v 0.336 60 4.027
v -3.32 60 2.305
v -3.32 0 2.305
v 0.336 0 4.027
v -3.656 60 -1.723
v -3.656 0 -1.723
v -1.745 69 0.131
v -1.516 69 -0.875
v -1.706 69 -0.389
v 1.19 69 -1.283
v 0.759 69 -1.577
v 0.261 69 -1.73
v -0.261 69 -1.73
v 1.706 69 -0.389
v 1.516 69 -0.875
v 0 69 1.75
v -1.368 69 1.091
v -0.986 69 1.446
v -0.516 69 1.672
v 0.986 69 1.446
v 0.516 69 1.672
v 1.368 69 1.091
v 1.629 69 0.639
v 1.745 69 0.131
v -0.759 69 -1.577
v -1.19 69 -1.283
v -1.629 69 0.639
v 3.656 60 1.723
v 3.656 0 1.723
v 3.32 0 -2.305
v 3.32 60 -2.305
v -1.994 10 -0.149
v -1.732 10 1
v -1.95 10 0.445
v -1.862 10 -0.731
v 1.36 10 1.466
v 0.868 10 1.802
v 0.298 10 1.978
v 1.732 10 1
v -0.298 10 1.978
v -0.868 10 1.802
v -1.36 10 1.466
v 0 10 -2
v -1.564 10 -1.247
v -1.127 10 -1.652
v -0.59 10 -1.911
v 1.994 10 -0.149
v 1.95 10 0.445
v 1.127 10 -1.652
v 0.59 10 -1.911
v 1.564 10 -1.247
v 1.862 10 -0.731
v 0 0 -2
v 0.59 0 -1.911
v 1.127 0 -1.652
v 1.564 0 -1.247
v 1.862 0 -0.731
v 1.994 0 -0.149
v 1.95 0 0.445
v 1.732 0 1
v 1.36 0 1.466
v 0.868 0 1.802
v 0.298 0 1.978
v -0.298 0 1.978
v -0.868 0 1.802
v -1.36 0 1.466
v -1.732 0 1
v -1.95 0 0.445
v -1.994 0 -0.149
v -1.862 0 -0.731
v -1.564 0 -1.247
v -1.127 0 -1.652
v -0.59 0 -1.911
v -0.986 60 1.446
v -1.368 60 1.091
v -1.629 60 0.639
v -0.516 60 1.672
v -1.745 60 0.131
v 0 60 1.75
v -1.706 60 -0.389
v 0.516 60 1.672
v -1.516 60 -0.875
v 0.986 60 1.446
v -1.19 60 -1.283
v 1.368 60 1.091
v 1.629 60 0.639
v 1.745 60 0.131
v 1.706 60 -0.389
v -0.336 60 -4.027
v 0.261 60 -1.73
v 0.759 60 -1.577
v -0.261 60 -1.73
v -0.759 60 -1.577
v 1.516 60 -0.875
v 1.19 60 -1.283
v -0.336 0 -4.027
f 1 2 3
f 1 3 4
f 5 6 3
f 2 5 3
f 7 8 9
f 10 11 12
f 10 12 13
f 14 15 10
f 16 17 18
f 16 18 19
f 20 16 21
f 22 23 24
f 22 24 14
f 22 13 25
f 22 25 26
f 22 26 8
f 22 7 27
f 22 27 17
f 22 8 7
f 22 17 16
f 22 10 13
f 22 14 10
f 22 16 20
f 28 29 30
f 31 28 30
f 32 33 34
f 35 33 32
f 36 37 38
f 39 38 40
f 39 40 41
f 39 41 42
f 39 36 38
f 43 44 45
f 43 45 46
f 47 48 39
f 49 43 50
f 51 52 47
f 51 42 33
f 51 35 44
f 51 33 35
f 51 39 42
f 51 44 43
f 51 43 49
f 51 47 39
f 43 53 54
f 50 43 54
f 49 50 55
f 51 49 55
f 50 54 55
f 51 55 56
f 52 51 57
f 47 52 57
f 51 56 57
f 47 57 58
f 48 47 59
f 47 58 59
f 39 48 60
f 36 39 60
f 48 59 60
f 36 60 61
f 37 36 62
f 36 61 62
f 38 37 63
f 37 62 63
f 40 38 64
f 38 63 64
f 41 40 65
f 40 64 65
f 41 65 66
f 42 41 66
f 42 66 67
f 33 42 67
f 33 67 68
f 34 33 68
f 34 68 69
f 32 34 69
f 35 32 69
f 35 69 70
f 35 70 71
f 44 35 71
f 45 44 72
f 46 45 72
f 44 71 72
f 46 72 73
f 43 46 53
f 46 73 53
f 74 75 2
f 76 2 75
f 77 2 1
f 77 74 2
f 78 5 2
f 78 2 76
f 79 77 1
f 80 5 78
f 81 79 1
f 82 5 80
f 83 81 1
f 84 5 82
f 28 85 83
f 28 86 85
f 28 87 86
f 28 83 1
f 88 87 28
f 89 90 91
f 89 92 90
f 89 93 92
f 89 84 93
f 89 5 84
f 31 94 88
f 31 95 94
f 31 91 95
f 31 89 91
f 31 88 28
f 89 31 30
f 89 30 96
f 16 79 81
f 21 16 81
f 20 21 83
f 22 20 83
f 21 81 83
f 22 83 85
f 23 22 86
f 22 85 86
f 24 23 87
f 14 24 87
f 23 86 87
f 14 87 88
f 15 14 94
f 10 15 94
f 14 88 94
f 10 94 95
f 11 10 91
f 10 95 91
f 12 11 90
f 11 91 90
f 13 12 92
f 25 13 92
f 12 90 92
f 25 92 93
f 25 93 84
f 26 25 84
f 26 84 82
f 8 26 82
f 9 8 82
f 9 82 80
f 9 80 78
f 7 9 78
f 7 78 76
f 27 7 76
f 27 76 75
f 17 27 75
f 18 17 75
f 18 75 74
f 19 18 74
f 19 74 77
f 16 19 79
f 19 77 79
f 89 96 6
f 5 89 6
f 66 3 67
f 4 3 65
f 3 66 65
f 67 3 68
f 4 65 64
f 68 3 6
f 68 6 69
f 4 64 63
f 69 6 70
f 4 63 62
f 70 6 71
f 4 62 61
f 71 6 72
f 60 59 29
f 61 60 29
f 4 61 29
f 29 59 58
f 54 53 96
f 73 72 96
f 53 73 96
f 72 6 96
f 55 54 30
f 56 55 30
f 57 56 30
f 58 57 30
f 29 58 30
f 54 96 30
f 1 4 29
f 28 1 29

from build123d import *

# Parameters (mm, degrees)
BOSS_EXTRU_1_DEPTH      = 60
ESQUISSE2_R             = 2
ENL_V_MAT_EXTRU_1_DEPTH = 10
ESQUISSE3_R             = 1.75
BOSS_EXTRU_2_DEPTH      = 9


with BuildPart() as part:
    # Esquisse1 → Boss.-Extru.1 (new body)
    with BuildSketch(Plane(origin=(0, 0, 0), x_dir=(1, 0, 0), z_dir=(0, 1, 0))):
        Polygon((3.655828371, -1.722861646), (3.319956139, 2.304609418), (-0.335872233, 4.027471065), (-3.655828371, 1.722861646), (-3.319956139, -2.304609418), (0.335872233, -4.027471065), align=None)
    extrude(amount=BOSS_EXTRU_1_DEPTH)

    # Esquisse2 → Enlèv. mat.-Extru.1 (cut)
    with BuildSketch(Plane.XZ):
        with Locations(Location((0, 0, 0), (0, 0, 270))):
            Circle(ESQUISSE2_R)
    extrude(amount=-ENL_V_MAT_EXTRU_1_DEPTH, mode=Mode.SUBTRACT)

    # Esquisse3 → Boss.-Extru.2 (add)
    with BuildSketch(Plane(origin=(0, 60, 0), x_dir=(1, 0, 0), z_dir=(0, 1, 0))):
        with Locations(Location((0, 0, 0), (0, 0, 270))):
            Circle(ESQUISSE3_R)
    extrude(amount=BOSS_EXTRU_2_DEPTH)


solid = part.part
